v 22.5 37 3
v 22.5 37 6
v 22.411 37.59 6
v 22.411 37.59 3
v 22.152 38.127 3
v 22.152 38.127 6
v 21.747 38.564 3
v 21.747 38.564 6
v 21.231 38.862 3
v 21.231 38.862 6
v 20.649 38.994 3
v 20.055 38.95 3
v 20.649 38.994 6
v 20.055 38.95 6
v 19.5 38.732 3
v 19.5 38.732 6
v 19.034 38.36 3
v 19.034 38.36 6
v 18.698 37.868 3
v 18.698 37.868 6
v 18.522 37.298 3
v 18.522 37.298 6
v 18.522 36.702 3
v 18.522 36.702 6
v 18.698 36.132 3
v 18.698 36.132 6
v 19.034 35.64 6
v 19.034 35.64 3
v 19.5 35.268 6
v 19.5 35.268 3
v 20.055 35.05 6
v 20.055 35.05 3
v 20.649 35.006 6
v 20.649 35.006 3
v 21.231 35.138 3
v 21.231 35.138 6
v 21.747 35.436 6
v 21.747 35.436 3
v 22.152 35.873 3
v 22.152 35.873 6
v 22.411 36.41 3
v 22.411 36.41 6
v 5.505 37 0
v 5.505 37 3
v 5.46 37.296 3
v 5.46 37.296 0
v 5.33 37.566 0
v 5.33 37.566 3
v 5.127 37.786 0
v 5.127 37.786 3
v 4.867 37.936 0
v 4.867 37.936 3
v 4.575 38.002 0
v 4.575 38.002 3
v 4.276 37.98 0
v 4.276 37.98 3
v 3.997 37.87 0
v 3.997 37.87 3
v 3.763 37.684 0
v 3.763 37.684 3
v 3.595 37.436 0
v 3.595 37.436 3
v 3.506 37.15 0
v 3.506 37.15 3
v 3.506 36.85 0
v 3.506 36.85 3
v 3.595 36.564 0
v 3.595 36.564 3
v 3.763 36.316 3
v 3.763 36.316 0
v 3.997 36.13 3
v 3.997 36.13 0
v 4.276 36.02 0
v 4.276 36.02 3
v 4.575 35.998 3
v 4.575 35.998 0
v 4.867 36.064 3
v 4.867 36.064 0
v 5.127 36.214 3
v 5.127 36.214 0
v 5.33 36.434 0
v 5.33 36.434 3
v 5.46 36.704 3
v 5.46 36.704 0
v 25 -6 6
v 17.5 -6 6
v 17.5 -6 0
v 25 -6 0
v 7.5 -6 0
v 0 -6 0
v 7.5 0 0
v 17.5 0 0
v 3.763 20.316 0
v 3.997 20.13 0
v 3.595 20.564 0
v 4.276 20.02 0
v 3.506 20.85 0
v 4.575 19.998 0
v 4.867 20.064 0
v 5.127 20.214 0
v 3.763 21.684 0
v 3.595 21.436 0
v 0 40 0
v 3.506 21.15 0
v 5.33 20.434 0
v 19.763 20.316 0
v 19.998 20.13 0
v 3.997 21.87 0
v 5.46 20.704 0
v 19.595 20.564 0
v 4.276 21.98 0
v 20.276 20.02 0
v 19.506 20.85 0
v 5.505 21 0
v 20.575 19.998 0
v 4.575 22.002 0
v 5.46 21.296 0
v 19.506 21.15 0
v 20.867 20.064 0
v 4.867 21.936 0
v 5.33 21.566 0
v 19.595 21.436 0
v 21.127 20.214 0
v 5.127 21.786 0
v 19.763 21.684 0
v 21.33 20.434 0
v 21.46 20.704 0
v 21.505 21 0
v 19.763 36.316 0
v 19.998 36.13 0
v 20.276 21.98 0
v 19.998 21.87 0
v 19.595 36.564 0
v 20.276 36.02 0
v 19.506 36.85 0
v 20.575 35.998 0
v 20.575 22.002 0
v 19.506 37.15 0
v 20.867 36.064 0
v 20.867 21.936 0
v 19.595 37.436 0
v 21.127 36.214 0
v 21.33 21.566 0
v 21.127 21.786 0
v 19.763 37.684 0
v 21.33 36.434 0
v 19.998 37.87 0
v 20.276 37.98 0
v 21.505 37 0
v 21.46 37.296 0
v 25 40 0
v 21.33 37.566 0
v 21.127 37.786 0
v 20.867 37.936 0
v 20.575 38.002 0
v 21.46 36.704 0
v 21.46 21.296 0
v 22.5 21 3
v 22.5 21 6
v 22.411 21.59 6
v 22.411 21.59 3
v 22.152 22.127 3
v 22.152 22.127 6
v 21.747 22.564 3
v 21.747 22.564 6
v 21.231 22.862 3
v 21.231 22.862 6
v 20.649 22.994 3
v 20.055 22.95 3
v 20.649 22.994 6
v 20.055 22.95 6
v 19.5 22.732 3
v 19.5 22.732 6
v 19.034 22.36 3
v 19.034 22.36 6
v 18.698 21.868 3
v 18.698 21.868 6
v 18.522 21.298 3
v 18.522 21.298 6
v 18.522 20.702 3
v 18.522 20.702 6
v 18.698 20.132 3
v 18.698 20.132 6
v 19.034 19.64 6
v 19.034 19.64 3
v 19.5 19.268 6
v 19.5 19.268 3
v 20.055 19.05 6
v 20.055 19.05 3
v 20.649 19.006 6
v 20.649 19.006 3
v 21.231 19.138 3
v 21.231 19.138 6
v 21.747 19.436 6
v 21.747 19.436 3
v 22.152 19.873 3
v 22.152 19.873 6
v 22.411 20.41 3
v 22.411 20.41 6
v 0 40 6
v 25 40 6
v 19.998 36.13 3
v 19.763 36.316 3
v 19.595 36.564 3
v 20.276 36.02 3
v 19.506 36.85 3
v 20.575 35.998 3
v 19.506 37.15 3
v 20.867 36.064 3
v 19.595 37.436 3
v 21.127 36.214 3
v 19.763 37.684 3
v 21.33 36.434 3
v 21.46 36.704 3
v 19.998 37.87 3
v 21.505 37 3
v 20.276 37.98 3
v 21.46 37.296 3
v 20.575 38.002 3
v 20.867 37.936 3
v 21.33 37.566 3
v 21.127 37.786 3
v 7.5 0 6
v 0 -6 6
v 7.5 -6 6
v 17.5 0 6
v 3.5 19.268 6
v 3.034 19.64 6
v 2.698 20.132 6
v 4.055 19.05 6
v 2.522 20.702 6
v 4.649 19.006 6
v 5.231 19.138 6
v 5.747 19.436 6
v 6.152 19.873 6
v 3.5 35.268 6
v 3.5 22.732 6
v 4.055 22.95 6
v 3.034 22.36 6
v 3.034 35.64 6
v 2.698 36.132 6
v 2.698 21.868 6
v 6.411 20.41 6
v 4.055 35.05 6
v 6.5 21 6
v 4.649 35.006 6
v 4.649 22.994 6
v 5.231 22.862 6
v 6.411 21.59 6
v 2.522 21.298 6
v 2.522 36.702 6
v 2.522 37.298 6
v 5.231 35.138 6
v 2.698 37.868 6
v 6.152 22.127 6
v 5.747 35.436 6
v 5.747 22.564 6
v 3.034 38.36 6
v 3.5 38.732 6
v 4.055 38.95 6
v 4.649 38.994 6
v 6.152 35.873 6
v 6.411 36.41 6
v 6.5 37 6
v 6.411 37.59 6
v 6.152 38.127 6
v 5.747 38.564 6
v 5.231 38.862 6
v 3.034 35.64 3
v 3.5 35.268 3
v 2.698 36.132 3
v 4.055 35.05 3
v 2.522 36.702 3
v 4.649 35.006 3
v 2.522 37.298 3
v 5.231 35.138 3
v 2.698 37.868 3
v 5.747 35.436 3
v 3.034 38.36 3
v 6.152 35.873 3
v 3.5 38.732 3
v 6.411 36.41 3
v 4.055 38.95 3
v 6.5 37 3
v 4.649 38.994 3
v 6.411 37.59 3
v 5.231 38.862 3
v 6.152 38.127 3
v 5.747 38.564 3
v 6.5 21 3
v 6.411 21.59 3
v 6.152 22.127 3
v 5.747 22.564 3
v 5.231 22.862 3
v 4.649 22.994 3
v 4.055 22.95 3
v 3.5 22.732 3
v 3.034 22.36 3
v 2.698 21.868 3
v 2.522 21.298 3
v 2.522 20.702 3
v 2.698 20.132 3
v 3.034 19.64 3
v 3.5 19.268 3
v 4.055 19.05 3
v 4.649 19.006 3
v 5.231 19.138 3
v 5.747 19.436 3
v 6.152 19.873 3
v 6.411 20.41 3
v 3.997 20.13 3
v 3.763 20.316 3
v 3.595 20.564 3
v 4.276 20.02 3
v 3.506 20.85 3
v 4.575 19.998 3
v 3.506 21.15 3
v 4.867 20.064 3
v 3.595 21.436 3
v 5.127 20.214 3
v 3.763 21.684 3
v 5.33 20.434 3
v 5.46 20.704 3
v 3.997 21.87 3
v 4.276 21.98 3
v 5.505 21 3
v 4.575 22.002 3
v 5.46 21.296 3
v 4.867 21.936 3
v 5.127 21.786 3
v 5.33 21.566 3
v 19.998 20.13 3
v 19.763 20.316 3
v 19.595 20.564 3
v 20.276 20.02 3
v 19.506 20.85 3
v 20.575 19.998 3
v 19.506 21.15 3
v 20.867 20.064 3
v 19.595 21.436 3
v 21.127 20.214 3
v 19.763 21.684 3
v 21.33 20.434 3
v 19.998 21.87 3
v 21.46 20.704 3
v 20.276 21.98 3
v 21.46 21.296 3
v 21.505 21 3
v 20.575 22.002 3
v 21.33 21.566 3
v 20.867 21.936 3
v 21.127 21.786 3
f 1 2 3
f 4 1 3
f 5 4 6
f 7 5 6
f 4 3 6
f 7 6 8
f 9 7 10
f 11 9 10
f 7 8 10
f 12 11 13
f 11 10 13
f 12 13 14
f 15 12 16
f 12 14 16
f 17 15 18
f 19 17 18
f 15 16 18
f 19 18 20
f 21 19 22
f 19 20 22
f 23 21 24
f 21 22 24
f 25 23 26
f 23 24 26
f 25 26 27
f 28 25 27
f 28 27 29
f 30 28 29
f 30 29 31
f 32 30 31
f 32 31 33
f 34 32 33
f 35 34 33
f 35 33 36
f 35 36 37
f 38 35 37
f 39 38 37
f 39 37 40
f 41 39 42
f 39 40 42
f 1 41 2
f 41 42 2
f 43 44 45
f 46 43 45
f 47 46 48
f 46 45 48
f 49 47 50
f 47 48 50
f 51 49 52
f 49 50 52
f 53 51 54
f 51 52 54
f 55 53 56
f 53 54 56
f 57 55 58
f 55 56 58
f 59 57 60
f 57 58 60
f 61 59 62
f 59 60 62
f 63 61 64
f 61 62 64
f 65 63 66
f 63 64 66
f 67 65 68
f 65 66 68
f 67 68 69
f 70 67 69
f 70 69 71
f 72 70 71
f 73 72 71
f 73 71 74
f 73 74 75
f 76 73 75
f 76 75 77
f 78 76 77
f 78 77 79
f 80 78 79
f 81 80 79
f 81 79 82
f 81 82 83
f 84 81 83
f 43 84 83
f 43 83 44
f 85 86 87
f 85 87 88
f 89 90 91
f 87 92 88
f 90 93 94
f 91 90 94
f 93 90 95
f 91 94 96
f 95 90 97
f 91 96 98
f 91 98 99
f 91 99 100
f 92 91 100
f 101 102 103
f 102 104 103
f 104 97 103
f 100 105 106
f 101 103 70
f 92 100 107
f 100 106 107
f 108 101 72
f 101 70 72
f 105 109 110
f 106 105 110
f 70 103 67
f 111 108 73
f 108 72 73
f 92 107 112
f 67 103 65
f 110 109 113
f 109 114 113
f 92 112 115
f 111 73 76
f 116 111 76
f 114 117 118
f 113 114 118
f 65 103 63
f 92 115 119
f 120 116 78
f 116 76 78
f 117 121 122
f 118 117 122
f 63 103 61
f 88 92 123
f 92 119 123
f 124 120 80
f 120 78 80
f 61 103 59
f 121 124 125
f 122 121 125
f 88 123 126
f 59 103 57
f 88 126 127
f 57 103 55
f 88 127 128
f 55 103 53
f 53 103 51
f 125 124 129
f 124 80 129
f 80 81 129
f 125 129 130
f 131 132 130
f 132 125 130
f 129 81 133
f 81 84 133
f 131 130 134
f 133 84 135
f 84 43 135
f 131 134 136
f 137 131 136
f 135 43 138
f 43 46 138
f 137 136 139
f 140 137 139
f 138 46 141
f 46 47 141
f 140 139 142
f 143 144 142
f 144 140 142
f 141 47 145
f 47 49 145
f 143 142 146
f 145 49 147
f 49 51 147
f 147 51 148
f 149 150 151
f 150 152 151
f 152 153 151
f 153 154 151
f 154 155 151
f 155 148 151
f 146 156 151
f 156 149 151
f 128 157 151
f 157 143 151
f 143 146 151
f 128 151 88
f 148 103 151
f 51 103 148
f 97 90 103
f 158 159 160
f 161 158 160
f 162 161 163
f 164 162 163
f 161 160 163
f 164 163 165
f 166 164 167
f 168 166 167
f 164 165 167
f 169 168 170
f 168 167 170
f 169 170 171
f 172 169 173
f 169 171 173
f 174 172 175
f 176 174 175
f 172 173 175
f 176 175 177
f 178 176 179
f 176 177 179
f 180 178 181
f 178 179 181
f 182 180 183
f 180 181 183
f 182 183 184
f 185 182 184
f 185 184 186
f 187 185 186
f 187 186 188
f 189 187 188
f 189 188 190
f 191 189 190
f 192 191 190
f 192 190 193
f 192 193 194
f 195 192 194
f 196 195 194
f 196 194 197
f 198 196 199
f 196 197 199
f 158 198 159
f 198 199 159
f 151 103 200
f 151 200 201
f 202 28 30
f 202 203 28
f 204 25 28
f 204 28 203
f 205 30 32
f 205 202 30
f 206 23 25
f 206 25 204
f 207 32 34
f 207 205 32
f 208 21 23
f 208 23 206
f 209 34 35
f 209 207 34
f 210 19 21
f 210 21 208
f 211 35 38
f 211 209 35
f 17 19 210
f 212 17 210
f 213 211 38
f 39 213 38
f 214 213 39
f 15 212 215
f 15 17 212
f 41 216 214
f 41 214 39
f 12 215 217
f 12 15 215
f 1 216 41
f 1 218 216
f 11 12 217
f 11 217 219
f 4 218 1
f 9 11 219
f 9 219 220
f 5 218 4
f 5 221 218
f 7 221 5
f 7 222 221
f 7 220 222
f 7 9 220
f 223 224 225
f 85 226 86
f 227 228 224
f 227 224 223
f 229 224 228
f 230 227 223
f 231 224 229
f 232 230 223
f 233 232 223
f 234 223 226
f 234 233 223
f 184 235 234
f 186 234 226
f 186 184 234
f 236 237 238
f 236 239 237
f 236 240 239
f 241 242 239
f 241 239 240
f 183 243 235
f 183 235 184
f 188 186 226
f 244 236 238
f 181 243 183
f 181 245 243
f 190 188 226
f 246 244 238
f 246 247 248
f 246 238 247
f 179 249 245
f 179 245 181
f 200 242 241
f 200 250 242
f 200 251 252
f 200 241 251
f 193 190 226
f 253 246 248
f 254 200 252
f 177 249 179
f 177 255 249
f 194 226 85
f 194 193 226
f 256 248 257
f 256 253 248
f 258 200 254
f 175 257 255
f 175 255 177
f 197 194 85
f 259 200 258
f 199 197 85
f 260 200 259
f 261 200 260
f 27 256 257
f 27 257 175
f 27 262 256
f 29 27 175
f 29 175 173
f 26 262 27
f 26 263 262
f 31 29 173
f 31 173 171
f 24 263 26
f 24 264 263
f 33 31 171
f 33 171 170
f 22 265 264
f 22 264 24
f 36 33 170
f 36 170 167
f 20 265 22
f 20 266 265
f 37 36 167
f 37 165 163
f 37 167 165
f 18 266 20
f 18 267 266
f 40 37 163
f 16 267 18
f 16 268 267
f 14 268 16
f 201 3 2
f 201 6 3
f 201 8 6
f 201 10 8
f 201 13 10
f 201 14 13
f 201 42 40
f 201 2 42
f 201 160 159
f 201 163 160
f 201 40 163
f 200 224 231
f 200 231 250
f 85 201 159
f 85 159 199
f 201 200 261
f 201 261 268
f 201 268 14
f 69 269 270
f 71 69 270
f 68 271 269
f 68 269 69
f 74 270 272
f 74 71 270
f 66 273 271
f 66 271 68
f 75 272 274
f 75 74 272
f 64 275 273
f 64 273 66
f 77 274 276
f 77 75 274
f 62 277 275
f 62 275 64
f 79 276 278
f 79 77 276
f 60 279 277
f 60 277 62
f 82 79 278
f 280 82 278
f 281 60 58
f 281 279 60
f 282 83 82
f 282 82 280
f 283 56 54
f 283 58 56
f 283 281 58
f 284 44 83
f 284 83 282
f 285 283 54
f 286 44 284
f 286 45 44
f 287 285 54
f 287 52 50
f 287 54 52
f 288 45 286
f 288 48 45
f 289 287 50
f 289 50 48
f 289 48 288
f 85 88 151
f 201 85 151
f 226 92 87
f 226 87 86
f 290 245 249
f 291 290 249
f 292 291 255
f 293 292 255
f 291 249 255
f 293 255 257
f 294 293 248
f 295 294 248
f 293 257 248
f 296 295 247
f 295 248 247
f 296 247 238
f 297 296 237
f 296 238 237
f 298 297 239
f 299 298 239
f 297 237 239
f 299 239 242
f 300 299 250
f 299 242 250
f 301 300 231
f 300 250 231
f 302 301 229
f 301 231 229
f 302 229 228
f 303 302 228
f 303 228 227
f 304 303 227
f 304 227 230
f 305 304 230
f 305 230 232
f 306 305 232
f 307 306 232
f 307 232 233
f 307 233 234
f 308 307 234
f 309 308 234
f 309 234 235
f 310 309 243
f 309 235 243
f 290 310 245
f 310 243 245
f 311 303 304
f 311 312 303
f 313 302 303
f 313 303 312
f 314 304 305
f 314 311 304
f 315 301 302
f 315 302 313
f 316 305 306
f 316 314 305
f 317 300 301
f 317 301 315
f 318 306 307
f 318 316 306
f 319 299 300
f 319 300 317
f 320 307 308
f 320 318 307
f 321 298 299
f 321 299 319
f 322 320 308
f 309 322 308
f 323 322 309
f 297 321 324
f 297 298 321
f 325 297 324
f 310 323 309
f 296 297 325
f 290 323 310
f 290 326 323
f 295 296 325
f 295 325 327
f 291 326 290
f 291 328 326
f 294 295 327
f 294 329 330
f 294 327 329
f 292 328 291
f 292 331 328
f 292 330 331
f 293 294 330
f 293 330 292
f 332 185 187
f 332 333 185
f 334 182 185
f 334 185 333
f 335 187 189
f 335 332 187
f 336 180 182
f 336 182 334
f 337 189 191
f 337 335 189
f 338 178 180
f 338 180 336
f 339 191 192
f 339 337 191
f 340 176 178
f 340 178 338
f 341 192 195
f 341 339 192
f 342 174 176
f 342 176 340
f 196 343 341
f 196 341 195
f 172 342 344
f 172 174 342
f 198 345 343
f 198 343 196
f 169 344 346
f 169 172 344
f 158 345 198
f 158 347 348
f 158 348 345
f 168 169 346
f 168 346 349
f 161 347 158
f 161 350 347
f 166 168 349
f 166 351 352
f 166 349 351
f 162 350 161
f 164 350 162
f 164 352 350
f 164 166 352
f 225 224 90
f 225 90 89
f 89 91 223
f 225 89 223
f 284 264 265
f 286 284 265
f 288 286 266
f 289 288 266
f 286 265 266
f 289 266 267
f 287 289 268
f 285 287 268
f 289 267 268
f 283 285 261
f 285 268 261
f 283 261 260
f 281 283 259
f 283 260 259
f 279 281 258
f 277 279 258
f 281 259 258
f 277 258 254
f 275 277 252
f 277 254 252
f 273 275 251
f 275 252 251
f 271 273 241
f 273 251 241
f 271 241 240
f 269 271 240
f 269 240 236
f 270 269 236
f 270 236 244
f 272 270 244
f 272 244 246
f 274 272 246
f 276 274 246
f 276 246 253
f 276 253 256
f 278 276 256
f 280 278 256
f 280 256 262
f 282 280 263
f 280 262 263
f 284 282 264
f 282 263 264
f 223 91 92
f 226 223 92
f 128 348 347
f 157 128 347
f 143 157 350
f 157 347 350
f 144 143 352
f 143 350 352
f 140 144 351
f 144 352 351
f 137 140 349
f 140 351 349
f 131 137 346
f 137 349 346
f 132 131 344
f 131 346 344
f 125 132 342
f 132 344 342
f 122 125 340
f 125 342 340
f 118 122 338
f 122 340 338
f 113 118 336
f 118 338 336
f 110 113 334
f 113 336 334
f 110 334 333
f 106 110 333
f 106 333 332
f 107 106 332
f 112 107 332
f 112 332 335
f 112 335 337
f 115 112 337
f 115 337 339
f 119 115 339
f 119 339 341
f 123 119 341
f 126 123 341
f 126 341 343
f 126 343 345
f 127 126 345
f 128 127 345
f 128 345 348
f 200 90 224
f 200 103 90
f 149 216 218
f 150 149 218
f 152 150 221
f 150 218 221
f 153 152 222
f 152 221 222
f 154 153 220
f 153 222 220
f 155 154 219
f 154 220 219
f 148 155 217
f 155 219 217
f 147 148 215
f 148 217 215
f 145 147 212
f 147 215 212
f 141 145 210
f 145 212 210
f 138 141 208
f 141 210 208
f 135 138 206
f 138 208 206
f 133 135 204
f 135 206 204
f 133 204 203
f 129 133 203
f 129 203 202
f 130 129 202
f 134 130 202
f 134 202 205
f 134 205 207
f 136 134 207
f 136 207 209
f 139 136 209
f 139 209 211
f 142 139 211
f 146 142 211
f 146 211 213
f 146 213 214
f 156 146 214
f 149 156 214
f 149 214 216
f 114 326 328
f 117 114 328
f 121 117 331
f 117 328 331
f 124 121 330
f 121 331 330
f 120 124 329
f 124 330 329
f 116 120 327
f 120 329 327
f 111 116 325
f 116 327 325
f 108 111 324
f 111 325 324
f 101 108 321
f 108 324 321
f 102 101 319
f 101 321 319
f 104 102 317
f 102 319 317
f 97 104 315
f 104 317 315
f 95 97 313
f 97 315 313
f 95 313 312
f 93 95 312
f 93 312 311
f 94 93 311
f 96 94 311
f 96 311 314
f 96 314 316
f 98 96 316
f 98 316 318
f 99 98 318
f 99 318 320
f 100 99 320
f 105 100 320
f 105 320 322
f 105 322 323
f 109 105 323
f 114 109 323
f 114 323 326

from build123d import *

# Parameters (mm, degrees)
ESQUISSE1_W             = 25
ESQUISSE1_H             = 40
BOSS_EXTRU_1_DEPTH      = 6
ESQUISSE2_R             = 1.005
ENL_V_MAT_EXTRU_1_DEPTH = 6
ESQUISSE3_R             = 2
ENL_V_MAT_EXTRU_2_DEPTH = 3
ESQUISSE4_W             = 7.5
ESQUISSE4_H             = 6
BOSS_EXTRU_2_DEPTH      = 6


with BuildPart() as part:
    # Esquisse1 → Boss.-Extru.1 (new body)
    with BuildSketch(Plane.XY):
        with Locations((12.5, 20)):
            Rectangle(ESQUISSE1_W, ESQUISSE1_H)
    extrude(amount=BOSS_EXTRU_1_DEPTH)

    # Esquisse2 → Enlèv. mat.-Extru.1 (cut)
    with BuildSketch(Plane.XY.offset(6)):
        with Locations((4.5, 37)):
            Circle(ESQUISSE2_R)
        with Locations((20.5, 37)):
            Circle(ESQUISSE2_R)
        with Locations((4.5, 21)):
            Circle(ESQUISSE2_R)
        with Locations((20.5, 21)):
            Circle(ESQUISSE2_R)
    extrude(amount=-ENL_V_MAT_EXTRU_1_DEPTH, mode=Mode.SUBTRACT)

    # Esquisse3 → Enlèv. mat.-Extru.2 (cut)
    with BuildSketch(Plane.XY.offset(6)):
        with Locations((4.5, 37)):
            Circle(ESQUISSE3_R)
        with Locations((20.5, 37)):
            Circle(ESQUISSE3_R)
        with Locations((4.5, 21)):
            Circle(ESQUISSE3_R)
        with Locations((20.5, 21)):
            Circle(ESQUISSE3_R)
    extrude(amount=-ENL_V_MAT_EXTRU_2_DEPTH, mode=Mode.SUBTRACT)

    # Esquisse4 → Boss.-Extru.2 (add)
    with BuildSketch(Plane.XZ):
        with Locations((3.75, 3)):
            Rectangle(ESQUISSE4_W, ESQUISSE4_H)
        with Locations((21.25, 3)):
            Rectangle(ESQUISSE4_W, ESQUISSE4_H)
    extrude(amount=BOSS_EXTRU_2_DEPTH)


solid = part.part
